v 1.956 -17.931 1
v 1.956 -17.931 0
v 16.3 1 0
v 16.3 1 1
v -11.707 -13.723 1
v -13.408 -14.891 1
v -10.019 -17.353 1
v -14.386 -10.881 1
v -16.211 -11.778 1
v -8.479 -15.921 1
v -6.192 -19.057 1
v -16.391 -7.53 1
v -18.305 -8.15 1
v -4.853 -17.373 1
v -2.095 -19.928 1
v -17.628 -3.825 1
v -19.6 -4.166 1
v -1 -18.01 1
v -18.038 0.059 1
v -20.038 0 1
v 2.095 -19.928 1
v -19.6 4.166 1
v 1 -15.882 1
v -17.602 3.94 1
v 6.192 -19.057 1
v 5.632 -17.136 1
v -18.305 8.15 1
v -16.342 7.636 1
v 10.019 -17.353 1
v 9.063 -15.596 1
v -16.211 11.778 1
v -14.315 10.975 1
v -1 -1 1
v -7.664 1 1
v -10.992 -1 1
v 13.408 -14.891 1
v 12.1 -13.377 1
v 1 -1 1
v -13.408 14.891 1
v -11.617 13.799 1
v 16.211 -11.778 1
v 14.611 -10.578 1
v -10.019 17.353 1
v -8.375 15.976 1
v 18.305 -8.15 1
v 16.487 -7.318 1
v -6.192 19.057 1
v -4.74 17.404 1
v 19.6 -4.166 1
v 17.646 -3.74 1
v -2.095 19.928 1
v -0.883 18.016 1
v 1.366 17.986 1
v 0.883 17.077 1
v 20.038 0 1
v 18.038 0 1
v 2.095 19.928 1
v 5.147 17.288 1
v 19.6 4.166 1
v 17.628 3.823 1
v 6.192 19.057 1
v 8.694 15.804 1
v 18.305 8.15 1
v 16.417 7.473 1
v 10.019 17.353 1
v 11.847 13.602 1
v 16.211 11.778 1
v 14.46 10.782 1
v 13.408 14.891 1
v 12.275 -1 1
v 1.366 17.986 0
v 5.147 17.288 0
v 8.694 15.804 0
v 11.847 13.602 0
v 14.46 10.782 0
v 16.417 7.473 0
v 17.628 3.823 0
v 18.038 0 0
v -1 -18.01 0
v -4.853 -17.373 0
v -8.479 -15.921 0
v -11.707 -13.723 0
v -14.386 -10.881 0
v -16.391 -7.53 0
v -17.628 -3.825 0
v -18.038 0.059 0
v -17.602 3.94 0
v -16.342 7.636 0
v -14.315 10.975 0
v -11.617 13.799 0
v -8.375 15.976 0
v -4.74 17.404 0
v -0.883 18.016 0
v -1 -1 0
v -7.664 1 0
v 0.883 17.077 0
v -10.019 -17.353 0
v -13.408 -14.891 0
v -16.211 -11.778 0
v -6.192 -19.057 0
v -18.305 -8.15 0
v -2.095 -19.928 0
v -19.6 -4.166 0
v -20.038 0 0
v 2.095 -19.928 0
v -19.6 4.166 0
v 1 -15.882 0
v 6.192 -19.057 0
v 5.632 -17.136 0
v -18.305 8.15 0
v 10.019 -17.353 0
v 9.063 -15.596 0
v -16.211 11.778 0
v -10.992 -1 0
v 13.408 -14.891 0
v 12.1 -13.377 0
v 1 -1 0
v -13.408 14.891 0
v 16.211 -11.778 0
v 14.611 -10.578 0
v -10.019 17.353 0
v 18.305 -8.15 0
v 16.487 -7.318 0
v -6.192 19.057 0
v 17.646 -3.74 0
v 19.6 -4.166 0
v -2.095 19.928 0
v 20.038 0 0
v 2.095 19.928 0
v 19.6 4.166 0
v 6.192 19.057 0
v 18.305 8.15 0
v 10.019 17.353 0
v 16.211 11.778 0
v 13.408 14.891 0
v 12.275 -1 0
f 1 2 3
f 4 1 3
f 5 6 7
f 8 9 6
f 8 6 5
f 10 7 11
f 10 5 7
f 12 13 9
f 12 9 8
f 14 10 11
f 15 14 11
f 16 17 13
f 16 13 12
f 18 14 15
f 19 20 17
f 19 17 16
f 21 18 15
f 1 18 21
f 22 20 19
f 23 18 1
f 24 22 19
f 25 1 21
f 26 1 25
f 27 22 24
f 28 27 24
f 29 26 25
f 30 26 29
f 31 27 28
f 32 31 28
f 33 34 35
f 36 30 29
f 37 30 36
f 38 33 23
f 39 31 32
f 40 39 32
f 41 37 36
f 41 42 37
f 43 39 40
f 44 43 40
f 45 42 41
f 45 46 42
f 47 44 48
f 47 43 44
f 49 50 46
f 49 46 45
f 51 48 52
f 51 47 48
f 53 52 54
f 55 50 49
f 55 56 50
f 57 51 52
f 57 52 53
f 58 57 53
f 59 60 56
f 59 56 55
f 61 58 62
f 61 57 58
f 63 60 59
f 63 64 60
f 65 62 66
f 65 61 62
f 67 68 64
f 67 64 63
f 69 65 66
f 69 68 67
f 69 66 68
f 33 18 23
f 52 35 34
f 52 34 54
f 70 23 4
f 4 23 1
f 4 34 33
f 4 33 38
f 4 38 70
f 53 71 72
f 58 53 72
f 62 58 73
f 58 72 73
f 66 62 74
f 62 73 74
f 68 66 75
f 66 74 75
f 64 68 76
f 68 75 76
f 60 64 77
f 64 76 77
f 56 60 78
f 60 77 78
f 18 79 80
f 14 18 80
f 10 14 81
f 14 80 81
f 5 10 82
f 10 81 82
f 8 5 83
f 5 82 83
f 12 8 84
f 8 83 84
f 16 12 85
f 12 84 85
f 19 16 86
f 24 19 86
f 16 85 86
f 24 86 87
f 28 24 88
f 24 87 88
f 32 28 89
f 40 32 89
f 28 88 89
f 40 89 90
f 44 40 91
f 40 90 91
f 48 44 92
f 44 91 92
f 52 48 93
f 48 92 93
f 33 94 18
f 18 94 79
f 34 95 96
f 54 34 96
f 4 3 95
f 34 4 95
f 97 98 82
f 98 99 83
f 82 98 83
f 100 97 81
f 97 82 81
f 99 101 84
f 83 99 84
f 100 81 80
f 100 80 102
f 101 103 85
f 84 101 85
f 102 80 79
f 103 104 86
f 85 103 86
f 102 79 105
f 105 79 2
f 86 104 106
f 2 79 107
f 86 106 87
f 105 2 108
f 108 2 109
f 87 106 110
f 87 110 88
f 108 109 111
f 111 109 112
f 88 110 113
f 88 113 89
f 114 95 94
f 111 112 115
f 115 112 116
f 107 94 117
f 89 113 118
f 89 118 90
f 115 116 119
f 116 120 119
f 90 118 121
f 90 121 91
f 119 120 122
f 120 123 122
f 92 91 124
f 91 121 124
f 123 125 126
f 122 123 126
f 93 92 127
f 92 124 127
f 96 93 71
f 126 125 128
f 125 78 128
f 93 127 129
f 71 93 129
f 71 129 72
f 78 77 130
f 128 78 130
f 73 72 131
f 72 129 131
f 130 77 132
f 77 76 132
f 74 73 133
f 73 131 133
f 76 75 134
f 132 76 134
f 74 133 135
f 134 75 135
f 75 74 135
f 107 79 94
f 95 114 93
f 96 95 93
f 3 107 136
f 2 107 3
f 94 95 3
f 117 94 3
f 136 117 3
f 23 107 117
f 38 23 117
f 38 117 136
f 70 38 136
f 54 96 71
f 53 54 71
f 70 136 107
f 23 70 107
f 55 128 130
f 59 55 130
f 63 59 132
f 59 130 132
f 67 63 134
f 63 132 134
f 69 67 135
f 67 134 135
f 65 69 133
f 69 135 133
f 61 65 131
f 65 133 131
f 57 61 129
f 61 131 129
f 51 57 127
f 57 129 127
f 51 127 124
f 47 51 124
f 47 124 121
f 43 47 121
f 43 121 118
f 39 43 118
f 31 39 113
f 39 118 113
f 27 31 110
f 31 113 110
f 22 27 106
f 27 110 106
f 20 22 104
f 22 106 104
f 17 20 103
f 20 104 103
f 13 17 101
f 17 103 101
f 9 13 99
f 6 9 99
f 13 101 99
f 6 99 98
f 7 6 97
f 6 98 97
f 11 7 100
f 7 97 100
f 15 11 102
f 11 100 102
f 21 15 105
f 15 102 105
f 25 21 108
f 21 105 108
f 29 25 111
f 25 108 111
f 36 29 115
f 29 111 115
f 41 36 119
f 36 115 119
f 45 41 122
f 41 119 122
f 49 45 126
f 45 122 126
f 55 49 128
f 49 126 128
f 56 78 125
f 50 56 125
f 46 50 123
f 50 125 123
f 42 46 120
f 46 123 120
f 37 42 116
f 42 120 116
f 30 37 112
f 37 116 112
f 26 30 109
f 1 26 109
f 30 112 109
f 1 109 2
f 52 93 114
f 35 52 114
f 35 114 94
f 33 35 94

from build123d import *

# Parameters (mm, degrees)
F0_R     = 20.0378472318
F1_DEPTH = 1


with BuildPart() as f1:
    # F0 (on Top) → F1 (new body)
    with BuildSketch(Plane.XY):
        Circle(F0_R)
        with BuildLine():
            ThreePointArc((-1, -18.010106406), (-18.0377520859, 0.0585870494), (-0.8829856241, 18.0162223883))
            ThreePointArc((-0.8829856241, 18.0162223883), (0.2419860556, 18.0362239813), (1.3660161897, 17.9860482743))
            ThreePointArc((1.3660161897, 17.9860482743), (13.2288307137, 12.2622172018), (18.0378472318, 0))
            ThreePointArc((18.0378472318, 0), (13.4285198006, -12.0432050851), (1.9562398361, -17.9314544435))
            ThreePointArc((1.9562398361, -17.9314544435), (0.4797344983, -18.031466595), (-1, -18.010106406))
        make_face(mode=Mode.SUBTRACT)
        with BuildLine():
            Line((0.8829856241, 17.0774223292), (-0.8829856241, 18.0162223883))
            Line((-0.8829856241, 18.0162223883), (-10.9921143656, -1))
            Line((-10.9921143656, -1), (-1, -1))
            Line((-1, -1), (-1, -18.010106406))
            ThreePointArc((-1, -18.010106406), (0.4797344983, -18.031466595), (1.9562398361, -17.9314544435))
            Line((1.9562398361, -17.9314544435), (16.2997357547, 1))
            Line((16.2997357547, 1), (-7.6638607916, 1))
            Line((-7.6638607916, 1), (0.8829856241, 17.0774223292))
        make_face()
        Polygon((1, -15.8817395568), (1, -1), (12.2752124372, -1), align=None, mode=Mode.SUBTRACT)
        with BuildLine():
            ThreePointArc((1.3660161897, 17.9860482743), (0.2419860556, 18.0362239813), (-0.8829856241, 18.0162223883))
            Line((-0.8829856241, 18.0162223883), (0.8829856241, 17.0774223292))
            Line((0.8829856241, 17.0774223292), (1.3660161897, 17.9860482743))
        make_face()
    extrude(amount=F1_DEPTH)


solid = f1.part
